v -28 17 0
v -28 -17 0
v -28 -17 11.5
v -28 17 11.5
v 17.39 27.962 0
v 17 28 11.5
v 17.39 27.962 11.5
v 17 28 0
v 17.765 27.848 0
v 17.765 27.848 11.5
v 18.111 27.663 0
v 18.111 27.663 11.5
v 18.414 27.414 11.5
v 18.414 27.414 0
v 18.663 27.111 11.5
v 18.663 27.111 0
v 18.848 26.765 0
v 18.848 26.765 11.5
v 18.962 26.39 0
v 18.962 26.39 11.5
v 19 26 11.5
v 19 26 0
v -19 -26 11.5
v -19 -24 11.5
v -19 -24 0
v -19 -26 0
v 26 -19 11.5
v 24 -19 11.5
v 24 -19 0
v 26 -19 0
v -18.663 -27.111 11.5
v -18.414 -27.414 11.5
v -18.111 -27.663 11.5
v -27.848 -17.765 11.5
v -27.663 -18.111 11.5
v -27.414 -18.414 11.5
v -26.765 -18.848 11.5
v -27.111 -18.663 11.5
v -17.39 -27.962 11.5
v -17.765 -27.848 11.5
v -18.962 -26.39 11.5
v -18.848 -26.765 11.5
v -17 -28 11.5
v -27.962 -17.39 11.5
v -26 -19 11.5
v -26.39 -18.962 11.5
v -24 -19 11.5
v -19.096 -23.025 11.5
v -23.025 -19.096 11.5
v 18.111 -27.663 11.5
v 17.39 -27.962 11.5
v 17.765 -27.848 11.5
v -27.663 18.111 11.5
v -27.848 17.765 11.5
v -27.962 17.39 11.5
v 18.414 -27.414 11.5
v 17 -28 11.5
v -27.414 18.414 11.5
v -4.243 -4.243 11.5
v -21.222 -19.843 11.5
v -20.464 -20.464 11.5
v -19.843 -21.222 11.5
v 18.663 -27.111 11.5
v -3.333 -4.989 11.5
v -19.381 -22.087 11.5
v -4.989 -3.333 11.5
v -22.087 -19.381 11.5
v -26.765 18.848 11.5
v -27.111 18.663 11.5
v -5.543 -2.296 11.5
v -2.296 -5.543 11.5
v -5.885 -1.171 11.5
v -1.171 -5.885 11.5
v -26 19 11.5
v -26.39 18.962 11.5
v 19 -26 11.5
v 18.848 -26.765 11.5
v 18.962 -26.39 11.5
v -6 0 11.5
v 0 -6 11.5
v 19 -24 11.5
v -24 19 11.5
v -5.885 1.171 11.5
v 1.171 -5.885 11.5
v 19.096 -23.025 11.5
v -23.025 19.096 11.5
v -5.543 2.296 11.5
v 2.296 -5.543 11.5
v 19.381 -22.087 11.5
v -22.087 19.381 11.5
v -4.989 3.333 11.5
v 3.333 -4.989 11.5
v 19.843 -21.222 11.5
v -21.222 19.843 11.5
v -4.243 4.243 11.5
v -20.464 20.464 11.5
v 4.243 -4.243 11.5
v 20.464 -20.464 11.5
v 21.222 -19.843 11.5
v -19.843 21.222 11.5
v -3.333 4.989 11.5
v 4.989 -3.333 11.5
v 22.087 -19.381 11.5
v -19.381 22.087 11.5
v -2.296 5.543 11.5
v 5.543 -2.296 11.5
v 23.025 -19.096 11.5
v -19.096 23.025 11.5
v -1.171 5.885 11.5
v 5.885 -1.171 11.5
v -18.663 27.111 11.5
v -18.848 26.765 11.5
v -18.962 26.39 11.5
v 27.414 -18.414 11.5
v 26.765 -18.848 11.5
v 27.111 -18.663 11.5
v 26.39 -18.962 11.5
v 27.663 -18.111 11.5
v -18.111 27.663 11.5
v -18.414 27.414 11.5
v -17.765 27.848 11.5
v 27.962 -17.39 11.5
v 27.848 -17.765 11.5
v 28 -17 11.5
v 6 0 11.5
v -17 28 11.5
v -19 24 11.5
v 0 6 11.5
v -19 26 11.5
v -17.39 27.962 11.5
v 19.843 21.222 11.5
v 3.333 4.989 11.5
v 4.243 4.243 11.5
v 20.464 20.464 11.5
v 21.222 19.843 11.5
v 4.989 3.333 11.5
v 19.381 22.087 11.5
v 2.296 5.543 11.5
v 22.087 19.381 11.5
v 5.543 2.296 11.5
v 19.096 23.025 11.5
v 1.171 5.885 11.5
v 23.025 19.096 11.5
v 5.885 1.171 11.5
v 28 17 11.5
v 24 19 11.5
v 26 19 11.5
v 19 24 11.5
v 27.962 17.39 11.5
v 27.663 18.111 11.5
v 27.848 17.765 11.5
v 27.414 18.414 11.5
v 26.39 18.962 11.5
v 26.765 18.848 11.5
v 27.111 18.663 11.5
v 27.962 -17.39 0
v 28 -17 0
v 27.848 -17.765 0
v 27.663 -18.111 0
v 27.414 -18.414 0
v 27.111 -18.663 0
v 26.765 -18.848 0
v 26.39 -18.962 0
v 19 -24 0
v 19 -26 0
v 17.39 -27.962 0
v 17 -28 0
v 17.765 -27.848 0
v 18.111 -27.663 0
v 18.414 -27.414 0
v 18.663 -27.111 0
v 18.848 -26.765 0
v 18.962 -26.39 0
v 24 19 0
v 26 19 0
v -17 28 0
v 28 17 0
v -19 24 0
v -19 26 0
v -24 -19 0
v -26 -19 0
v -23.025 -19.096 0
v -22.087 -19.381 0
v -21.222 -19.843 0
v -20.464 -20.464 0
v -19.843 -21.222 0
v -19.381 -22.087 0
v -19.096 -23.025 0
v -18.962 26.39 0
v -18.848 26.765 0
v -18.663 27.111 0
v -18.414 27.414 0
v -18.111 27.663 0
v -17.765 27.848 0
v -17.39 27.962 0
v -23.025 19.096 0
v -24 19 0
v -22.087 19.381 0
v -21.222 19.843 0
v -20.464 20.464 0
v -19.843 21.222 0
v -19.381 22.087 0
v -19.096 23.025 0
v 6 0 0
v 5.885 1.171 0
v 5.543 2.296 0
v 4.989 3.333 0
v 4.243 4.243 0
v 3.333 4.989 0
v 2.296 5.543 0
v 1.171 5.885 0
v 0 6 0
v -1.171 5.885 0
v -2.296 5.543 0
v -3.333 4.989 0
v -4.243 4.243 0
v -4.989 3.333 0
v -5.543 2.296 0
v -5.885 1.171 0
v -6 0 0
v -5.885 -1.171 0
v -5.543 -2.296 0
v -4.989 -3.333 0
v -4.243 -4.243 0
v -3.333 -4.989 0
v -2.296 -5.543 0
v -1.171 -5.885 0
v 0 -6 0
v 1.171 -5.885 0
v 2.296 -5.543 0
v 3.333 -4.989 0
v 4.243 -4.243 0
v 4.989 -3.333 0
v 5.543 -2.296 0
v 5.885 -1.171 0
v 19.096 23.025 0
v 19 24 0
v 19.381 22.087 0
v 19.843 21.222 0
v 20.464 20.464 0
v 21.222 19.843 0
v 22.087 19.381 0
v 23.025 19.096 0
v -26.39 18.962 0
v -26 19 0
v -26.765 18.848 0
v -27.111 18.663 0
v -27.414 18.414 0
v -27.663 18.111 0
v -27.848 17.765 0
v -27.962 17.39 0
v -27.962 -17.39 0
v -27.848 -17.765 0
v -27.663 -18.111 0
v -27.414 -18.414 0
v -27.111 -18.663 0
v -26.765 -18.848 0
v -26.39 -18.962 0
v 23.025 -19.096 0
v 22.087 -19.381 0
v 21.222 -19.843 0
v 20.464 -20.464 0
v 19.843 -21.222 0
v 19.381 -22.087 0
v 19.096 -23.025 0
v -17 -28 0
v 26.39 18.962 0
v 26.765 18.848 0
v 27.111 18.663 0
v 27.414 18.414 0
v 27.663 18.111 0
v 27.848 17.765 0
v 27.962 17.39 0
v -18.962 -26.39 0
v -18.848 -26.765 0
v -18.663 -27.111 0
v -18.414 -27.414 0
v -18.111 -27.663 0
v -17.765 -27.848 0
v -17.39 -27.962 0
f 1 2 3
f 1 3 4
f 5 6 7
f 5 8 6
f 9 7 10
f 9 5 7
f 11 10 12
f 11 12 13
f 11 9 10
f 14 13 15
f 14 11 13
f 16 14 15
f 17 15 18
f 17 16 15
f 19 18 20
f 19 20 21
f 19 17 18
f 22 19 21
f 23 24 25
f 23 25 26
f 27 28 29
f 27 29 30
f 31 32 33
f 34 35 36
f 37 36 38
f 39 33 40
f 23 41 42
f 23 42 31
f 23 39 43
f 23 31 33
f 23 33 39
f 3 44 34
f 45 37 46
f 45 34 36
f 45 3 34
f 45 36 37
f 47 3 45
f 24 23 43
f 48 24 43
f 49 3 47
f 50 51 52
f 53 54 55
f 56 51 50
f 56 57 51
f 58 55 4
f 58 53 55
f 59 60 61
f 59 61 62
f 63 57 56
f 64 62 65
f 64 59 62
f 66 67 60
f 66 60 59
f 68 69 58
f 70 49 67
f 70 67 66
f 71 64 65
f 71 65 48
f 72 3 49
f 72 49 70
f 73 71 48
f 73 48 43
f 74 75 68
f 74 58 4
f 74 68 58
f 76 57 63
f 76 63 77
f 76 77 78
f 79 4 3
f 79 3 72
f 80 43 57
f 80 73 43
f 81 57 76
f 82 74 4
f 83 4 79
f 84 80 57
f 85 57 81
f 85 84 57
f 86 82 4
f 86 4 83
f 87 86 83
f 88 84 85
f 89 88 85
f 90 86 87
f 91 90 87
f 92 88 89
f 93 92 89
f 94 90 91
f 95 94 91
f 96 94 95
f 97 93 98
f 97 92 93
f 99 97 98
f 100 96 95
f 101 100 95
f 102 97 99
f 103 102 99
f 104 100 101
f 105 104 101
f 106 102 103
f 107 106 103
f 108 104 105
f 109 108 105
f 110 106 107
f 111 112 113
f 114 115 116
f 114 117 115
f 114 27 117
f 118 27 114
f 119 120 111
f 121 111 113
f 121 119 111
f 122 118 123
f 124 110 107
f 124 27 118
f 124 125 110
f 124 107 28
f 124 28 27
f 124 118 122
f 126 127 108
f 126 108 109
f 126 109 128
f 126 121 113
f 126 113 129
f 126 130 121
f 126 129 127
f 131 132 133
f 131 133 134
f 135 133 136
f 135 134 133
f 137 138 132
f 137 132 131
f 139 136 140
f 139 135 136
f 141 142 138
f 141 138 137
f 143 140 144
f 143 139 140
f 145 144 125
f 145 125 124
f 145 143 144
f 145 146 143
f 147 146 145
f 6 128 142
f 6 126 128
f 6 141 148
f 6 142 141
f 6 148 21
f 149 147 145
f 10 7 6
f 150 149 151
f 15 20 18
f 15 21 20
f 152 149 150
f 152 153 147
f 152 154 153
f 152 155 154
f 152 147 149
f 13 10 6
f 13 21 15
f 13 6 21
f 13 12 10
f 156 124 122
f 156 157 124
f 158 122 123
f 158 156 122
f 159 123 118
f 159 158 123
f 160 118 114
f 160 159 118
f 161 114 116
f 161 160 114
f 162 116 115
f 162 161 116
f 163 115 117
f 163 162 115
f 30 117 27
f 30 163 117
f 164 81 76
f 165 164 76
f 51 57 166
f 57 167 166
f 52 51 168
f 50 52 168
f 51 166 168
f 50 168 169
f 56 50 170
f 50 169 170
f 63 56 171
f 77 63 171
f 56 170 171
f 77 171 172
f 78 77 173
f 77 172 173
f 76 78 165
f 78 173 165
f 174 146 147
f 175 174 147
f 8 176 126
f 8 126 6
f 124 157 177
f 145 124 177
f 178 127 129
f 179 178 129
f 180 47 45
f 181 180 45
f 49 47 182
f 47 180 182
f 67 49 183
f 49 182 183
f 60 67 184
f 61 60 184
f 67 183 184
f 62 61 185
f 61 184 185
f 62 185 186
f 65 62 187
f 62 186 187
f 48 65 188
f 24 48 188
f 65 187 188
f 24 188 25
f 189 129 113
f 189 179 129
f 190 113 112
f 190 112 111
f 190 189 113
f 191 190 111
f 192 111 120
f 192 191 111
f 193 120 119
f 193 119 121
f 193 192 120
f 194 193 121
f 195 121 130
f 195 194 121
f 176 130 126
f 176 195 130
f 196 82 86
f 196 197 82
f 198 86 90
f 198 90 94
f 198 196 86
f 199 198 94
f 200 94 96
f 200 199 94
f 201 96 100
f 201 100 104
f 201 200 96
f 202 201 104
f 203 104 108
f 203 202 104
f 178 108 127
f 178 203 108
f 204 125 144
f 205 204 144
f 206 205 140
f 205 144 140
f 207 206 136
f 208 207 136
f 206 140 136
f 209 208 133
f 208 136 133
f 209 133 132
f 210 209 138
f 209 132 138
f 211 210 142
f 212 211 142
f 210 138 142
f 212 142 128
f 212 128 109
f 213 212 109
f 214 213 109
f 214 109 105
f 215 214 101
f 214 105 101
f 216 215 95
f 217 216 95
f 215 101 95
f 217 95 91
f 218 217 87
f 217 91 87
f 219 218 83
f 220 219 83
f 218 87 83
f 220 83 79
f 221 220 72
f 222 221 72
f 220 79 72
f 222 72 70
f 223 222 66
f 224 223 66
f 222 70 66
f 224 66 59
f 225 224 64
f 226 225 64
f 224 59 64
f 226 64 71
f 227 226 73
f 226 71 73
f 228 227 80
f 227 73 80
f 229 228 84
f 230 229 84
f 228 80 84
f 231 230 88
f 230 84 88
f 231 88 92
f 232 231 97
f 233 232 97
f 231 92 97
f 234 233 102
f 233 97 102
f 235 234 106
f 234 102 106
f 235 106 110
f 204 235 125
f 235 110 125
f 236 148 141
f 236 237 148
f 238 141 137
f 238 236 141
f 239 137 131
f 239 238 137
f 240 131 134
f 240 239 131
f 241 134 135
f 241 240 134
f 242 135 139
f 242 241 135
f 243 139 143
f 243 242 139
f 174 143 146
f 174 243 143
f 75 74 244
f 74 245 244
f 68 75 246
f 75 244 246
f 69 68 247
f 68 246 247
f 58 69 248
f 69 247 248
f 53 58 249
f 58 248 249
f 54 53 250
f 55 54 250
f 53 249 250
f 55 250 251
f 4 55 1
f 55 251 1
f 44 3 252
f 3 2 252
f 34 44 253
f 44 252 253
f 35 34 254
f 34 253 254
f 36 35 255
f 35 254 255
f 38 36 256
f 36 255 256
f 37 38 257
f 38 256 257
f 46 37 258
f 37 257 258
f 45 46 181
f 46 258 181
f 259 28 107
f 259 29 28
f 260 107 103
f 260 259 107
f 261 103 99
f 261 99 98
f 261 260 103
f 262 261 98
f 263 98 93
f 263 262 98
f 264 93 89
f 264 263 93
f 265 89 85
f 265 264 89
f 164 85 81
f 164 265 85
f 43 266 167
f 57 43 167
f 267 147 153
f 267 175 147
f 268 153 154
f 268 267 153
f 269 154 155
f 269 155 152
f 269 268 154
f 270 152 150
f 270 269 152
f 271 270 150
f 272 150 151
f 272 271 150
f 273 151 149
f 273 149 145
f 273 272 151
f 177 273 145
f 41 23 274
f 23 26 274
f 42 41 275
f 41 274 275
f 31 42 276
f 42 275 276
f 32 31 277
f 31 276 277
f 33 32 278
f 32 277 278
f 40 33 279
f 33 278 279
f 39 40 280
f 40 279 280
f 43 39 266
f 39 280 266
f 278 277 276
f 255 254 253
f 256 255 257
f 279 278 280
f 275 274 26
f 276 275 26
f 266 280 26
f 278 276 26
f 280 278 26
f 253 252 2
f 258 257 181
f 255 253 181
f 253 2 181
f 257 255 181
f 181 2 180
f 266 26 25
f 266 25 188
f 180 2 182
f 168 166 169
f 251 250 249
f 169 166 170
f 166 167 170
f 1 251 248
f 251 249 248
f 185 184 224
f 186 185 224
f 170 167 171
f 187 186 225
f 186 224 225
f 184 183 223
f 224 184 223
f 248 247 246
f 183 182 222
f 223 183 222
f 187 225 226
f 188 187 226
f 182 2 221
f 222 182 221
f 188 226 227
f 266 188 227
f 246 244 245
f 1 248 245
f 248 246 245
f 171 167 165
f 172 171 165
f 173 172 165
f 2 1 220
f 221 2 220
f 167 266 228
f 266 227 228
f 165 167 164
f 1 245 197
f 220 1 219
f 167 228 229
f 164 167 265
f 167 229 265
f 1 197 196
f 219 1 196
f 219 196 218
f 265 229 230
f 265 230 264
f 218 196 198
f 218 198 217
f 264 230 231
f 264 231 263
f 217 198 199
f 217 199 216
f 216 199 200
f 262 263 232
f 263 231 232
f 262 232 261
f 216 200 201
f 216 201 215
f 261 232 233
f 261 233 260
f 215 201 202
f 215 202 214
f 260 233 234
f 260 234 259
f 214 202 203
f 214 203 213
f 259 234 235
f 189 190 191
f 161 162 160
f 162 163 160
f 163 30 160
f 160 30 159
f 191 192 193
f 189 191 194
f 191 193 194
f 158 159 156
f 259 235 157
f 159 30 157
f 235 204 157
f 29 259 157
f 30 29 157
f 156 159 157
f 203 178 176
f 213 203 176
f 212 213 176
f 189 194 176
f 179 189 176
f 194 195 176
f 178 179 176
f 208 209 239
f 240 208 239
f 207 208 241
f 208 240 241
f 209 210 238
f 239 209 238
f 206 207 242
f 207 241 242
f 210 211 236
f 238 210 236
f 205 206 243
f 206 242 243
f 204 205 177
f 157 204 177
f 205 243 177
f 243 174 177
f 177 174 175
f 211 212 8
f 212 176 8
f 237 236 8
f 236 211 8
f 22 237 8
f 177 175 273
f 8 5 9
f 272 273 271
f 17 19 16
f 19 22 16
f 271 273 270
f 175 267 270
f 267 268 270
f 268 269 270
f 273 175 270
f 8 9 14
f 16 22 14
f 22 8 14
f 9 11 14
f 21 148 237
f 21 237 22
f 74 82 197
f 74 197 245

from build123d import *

# Parameters (mm, degrees)
SKETCH1_W           = 56
SKETCH1_H           = 56
BOSS_EXTRUDE1_DEPTH = 11.5
SKETCH2_W           = 9
SKETCH2_H           = 9
CUT_EXTRUDE1_DEPTH  = 11.5
CIRPATTERN1_COUNT   = 4
FILLET1_R           = 5
FILLET2_R           = 2
SKETCH3_R           = 6
CUT_EXTRUDE2_DEPTH  = 11.5


with BuildPart() as part:
    # Sketch1 → Boss-Extrude1 (new body)
    with BuildSketch(Plane.XY):
        Rectangle(SKETCH1_W, SKETCH1_H)
    extrude(amount=BOSS_EXTRUDE1_DEPTH)

    # Sketch2 → Cut-Extrude1 (cut)
    with BuildSketch(Plane.XY.offset(11.5)):
        with Locations((23.5, 23.5)):
            Rectangle(SKETCH2_W, SKETCH2_H)
    cut_extrude1 = extrude(amount=-CUT_EXTRUDE1_DEPTH, mode=Mode.SUBTRACT)

    # CirPattern1: Cut-Extrude1 ×4 about axis
    cirpattern1_axis = Axis((0, 0, -0.575), (0, 0, 1))
    for i in range(1, CIRPATTERN1_COUNT):
        add(cut_extrude1.rotate(cirpattern1_axis, i * 360 / CIRPATTERN1_COUNT), mode=Mode.SUBTRACT)

    # Fillet1
    fillet1_edges = [part.edges().sort_by_distance(p)[0] for p in [
        (-19, 19, 5.75),
        (-19, -19, 5.75),
        (19, -19, 5.75),
        (19, 19, 5.75),
    ]]
    fillet(fillet1_edges, radius=FILLET1_R)

    # Fillet2
    fillet2_edges = [part.edges().sort_by_distance(p)[0] for p in [
        (-28, 19, 5.75),
        (-19, 28, 5.75),
        (-19, -28, 5.75),
        (-28, -19, 5.75),
        (19, -28, 5.75),
        (28, -19, 5.75),
        (28, 19, 5.75),
        (19, 28, 5.75),
    ]]
    fillet(fillet2_edges, radius=FILLET2_R)

    # Sketch3 → Cut-Extrude2 (cut)
    with BuildSketch(Plane.XY.offset(11.5)):
        Circle(SKETCH3_R)
    extrude(amount=-CUT_EXTRUDE2_DEPTH, mode=Mode.SUBTRACT)


solid = part.part
